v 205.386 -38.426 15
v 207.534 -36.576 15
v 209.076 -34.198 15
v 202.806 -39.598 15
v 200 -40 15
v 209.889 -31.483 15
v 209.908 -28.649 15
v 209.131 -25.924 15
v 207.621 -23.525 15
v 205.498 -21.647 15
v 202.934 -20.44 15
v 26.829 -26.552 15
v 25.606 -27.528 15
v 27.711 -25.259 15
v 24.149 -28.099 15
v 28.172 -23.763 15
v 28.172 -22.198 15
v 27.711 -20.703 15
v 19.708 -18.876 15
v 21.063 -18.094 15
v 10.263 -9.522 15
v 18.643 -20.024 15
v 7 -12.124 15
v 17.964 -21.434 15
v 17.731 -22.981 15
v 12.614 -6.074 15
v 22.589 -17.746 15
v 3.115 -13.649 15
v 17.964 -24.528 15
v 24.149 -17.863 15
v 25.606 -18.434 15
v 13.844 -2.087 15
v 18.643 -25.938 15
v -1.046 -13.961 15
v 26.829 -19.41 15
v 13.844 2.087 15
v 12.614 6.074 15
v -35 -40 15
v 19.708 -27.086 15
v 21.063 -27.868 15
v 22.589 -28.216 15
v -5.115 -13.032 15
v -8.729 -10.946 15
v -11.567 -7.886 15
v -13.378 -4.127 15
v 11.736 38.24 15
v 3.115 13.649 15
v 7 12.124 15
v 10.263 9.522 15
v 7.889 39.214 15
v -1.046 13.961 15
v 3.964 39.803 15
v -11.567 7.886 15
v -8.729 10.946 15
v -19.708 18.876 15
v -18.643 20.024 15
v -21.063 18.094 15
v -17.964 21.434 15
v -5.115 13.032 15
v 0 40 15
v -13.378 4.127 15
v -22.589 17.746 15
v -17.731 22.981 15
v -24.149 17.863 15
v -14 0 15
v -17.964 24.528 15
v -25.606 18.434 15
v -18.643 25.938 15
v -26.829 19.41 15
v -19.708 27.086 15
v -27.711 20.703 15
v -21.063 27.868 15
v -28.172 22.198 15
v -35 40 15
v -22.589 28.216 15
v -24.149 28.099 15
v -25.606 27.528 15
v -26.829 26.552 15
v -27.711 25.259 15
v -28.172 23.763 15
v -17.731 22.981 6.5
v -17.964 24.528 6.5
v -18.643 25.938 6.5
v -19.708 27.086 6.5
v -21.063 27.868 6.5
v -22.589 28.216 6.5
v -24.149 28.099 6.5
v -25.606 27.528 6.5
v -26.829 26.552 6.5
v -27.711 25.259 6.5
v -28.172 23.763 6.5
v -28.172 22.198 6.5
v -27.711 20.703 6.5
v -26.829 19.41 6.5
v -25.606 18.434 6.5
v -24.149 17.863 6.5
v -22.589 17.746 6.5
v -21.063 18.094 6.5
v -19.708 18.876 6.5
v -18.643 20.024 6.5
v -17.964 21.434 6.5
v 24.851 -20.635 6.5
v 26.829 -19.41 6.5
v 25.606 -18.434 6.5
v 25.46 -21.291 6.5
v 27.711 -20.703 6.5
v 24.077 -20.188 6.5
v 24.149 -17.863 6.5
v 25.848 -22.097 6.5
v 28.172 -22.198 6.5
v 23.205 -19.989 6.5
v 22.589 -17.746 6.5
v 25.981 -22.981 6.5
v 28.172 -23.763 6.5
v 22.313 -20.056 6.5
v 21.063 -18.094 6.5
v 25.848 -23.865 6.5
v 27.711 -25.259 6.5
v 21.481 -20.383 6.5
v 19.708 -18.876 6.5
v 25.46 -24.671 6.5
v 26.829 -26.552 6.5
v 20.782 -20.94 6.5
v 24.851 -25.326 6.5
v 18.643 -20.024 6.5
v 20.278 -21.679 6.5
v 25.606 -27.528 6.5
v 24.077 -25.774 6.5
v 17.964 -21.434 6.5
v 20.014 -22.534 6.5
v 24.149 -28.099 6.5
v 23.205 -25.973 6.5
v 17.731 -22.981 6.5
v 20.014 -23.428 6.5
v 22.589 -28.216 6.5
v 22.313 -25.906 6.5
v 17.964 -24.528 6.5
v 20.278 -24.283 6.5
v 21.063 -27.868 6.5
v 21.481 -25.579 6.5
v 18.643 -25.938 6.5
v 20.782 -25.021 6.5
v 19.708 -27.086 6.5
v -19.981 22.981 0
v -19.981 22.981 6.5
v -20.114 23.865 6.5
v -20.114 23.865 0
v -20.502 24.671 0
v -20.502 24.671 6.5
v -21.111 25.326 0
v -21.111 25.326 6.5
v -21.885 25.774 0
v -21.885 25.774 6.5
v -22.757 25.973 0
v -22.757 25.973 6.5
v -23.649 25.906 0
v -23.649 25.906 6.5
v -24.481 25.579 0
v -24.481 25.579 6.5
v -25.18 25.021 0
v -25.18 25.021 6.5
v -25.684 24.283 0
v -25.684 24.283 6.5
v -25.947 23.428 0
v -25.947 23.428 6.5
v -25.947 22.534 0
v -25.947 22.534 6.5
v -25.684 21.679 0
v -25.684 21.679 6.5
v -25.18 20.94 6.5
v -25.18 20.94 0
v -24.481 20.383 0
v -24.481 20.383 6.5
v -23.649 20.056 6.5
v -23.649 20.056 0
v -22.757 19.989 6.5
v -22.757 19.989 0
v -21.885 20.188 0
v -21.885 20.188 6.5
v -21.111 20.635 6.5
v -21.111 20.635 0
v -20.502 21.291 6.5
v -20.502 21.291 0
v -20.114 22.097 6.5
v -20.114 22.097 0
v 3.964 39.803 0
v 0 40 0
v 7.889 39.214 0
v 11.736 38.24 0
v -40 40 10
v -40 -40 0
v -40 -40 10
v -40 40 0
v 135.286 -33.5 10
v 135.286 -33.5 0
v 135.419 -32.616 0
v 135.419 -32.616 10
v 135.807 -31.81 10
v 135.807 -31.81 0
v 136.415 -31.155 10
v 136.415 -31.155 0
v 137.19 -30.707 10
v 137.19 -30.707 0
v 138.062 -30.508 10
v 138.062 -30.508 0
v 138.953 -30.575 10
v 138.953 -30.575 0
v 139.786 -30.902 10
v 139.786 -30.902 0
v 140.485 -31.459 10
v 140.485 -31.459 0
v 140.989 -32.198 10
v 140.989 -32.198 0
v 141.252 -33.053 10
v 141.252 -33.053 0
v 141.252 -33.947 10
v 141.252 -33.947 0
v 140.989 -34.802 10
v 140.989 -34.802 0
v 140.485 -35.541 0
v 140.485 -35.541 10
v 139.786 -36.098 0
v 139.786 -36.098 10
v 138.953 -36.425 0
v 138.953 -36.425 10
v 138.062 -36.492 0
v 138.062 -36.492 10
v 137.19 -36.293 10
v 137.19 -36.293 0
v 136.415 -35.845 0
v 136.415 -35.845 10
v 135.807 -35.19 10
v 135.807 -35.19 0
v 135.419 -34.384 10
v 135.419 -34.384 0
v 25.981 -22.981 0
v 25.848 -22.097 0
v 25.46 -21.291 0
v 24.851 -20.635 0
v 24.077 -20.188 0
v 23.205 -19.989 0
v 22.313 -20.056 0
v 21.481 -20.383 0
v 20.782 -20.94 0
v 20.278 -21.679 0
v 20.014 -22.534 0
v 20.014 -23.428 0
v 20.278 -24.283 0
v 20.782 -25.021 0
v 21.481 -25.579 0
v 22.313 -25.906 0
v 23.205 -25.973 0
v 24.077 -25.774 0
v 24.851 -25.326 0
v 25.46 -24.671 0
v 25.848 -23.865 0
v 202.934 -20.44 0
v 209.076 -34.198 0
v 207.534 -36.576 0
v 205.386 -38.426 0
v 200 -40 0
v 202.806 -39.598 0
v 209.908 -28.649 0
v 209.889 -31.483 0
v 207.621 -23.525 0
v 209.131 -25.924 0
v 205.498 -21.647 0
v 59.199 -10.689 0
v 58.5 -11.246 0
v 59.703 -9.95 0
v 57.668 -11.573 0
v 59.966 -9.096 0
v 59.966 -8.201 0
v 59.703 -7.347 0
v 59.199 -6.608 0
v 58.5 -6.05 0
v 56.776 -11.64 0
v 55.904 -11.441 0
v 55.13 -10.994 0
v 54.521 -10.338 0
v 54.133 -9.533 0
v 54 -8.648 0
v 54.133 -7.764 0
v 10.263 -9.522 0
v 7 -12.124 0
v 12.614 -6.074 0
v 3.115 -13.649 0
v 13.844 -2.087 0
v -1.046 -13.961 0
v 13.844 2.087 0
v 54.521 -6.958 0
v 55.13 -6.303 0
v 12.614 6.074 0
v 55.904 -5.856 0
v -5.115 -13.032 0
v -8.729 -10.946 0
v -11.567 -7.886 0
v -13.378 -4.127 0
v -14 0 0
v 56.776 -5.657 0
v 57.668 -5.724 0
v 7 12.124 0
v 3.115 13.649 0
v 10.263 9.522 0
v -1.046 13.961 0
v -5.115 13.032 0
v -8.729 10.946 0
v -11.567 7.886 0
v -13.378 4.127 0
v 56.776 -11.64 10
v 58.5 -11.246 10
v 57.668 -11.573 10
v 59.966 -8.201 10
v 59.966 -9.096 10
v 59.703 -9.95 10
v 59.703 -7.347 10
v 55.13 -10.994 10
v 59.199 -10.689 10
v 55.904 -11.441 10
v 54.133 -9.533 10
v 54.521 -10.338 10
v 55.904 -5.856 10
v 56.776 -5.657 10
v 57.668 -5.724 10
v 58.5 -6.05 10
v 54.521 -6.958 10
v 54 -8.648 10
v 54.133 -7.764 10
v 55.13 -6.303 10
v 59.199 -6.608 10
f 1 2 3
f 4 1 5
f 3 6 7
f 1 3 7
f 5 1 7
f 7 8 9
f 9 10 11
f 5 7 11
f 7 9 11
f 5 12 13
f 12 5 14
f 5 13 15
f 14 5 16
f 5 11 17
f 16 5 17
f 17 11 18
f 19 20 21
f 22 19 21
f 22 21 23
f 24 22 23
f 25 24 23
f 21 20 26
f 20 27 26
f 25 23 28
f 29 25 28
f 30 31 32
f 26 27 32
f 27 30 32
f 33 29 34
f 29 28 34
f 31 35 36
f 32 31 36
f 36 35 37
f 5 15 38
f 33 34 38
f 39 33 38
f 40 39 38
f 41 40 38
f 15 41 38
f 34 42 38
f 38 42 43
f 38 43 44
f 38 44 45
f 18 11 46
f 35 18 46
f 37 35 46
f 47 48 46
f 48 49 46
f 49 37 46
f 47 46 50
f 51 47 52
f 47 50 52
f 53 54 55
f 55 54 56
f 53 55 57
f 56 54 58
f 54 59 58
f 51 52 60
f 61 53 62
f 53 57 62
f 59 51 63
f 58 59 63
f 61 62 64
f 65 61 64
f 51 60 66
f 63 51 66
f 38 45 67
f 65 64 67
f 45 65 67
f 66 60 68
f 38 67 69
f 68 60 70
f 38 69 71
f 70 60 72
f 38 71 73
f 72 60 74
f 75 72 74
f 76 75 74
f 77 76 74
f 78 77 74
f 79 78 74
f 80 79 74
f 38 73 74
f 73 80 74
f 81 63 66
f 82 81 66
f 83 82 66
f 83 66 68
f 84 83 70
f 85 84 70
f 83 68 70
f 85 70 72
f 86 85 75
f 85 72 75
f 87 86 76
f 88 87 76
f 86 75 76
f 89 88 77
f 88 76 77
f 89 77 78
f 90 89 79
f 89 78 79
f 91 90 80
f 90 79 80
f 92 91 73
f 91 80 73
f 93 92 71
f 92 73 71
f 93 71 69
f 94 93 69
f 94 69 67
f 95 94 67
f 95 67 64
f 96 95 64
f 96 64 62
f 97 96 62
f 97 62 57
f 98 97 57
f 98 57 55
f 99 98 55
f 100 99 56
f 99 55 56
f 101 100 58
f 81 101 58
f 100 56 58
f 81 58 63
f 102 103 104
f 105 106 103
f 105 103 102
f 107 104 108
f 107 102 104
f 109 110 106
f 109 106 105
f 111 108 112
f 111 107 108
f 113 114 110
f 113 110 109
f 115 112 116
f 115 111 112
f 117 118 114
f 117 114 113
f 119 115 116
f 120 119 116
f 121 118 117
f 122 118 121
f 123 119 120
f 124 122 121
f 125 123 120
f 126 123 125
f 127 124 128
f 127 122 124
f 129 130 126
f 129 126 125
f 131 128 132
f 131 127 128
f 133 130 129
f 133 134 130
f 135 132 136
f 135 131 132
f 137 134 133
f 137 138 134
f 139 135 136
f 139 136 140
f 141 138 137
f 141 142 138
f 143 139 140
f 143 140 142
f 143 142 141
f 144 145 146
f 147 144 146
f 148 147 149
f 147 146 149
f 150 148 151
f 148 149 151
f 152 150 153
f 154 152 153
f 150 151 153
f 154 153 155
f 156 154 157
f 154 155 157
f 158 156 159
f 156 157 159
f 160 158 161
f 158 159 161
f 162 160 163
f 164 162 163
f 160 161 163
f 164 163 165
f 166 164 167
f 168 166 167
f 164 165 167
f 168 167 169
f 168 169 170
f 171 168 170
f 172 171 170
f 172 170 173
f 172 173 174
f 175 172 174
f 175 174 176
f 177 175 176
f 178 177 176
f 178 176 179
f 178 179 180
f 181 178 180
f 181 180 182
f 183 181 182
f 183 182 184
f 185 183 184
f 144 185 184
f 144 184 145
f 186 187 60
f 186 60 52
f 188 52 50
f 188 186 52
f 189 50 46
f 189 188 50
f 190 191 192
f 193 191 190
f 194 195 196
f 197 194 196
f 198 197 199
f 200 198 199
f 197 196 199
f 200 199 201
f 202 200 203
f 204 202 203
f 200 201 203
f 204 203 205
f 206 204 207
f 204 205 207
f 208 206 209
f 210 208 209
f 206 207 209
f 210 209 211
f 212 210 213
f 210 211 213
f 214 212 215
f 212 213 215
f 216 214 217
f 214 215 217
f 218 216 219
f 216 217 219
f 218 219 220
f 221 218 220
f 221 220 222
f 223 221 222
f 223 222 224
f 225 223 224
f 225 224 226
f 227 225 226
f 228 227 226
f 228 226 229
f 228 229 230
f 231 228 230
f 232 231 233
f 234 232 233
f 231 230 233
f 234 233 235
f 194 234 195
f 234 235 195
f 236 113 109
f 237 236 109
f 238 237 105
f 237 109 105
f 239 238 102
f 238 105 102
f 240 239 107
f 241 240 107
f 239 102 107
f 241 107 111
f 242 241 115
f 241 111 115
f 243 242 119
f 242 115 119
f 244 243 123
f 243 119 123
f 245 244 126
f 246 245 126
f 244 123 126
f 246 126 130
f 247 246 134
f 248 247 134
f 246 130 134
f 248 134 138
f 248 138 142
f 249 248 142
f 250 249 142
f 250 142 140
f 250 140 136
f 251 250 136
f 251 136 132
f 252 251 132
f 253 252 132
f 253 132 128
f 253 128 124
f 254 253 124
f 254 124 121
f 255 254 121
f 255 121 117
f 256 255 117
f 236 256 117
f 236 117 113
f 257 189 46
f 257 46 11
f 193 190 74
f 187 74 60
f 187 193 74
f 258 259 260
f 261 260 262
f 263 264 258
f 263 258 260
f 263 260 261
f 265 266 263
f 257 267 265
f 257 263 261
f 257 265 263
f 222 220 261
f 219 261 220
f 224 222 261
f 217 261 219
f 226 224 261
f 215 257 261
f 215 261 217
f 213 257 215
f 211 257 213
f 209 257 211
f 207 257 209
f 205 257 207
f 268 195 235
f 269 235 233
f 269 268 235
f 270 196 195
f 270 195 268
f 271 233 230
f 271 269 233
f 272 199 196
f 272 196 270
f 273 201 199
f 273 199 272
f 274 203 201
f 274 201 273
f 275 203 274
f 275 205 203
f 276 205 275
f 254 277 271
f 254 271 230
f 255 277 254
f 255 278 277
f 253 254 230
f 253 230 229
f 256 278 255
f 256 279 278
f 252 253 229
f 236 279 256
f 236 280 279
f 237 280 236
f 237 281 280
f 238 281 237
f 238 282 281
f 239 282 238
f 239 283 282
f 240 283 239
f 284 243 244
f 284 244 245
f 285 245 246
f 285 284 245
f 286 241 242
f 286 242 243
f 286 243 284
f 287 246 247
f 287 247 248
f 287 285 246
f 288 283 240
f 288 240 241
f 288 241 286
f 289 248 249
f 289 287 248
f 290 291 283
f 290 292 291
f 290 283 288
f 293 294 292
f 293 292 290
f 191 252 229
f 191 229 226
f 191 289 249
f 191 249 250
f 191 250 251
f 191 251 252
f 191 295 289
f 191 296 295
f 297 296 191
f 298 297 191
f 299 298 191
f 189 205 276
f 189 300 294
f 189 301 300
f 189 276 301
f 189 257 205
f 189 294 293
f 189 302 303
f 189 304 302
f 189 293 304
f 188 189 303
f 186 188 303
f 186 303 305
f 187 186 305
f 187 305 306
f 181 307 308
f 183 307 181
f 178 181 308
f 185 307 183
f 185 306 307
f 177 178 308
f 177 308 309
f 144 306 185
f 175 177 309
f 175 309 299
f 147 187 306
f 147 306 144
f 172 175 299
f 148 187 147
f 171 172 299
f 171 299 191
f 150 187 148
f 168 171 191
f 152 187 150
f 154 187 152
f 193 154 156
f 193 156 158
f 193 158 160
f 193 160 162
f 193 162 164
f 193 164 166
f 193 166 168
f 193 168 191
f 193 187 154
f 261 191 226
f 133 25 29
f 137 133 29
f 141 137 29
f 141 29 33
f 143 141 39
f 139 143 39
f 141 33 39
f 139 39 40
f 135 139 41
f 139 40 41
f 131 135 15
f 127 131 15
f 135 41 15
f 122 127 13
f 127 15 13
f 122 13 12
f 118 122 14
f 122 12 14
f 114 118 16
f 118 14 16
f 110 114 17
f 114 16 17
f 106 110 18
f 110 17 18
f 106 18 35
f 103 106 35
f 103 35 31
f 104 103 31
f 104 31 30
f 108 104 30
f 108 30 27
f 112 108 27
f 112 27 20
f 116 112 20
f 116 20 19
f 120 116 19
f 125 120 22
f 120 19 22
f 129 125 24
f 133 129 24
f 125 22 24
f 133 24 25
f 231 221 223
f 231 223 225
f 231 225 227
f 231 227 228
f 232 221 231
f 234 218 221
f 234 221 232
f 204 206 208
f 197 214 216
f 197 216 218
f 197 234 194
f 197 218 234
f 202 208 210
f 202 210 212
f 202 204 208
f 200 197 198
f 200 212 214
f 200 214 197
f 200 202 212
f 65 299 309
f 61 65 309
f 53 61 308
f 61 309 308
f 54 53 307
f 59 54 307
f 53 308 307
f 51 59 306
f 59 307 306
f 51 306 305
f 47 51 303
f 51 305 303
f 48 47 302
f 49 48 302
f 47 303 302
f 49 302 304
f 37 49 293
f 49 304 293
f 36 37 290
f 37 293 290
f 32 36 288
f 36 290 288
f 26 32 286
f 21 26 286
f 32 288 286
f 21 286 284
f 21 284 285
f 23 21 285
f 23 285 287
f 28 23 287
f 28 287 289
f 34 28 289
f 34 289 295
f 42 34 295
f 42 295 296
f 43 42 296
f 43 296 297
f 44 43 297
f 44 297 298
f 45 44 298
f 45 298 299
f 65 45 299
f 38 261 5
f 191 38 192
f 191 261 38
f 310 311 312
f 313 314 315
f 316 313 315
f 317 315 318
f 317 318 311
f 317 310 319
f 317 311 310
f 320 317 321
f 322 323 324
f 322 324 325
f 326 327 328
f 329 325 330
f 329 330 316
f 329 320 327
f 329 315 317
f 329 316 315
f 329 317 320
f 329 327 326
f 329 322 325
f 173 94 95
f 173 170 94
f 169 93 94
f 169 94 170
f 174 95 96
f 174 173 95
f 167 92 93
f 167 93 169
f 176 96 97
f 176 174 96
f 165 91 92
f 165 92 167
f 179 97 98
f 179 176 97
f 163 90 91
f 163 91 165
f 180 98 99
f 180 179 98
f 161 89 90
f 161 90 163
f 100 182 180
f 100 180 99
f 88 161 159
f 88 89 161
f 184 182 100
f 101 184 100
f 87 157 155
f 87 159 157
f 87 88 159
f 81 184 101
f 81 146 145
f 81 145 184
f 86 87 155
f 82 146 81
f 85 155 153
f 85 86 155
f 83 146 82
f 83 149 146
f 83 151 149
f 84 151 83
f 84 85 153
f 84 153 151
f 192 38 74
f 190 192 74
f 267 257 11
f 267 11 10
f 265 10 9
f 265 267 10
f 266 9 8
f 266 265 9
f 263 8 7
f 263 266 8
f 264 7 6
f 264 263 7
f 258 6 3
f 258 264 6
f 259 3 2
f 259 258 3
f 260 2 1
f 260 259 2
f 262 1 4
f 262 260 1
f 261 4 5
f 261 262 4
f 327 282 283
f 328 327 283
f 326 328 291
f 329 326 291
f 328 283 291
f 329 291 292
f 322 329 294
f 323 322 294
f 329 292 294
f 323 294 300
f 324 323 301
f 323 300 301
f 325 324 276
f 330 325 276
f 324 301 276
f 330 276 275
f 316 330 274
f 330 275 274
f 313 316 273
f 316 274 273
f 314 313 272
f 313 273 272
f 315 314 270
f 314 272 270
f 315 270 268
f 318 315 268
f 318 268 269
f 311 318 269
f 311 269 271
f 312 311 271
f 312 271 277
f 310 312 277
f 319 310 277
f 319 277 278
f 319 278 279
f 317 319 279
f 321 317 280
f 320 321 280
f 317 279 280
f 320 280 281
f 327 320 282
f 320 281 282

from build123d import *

# Parameters (mm, degrees)
ESTRUSIONE1_DEPTH        = 15
SMUSSO1_SIZE             = 5
SCHIZZO2_R               = 14
TAGLIO_ESTRUSIONE1_DEPTH = 59.523499554
SCHIZZO4_R               = 3
TAGLIO_ESTRUSIONE3_DEPTH = 20
SCHIZZO5_R               = 5.25
TAGLIO_ESTRUSIONE4_DEPTH = 8.5
ESTRUSIONE2_START        = -15
ESTRUSIONE2_DEPTH        = 15
SCHIZZO9_R               = 3
TAGLIO_ESTRUSIONE7_DEPTH = 10


with BuildPart() as part:
    # Schizzo1 → Estrusione1 (new body)
    with BuildSketch(Plane.XY):
        with BuildLine():
            Line((-40, 40), (0, 40))
            ThreePointArc((0, 40), (40, 0), (0, -40))
            Line((0, -40), (-40, -40))
            Line((-40, -40), (-40, 40))
        make_face()
    extrude(amount=ESTRUSIONE1_DEPTH)

    # Smusso1
    smusso1_edges = [part.edges().sort_by_distance(p)[0] for p in [
        (-40, 0, 15),
    ]]
    chamfer(smusso1_edges, length=SMUSSO1_SIZE)

    # Schizzo2 → Taglio-Estrusione1 (cut, through all)
    with BuildSketch(Plane(origin=(0, 0, 0), x_dir=(-1, 0, 0), z_dir=(0, 0, -1))):
        Circle(SCHIZZO2_R)
    extrude(amount=-TAGLIO_ESTRUSIONE1_DEPTH, mode=Mode.SUBTRACT)

    # Schizzo4 → Taglio-Estrusione3 (cut)
    with BuildSketch(Plane.XY.offset(15)):
        with Locations((-22.980970389, 22.980970389)):
            Circle(SCHIZZO4_R)
        with Locations((22.980970389, -22.980970389)):
            Circle(SCHIZZO4_R)
    extrude(amount=-TAGLIO_ESTRUSIONE3_DEPTH, mode=Mode.SUBTRACT)

    # Schizzo5 → Taglio-Estrusione4 (cut)
    with BuildSketch(Plane.XY.offset(15)):
        with Locations((-22.980970389, 22.980970389)):
            Circle(SCHIZZO5_R)
        with Locations(Location((22.980970389, -22.980970389, 0), (0, 0, 180))):
            Circle(SCHIZZO5_R)
    extrude(amount=-TAGLIO_ESTRUSIONE4_DEPTH, mode=Mode.SUBTRACT)

    # Schizzo6 → Estrusione2 (add)
    with BuildSketch(Plane.XY.offset(15).offset(ESTRUSIONE2_START)):
        with BuildLine():
            Line((11.73594132, 38.239608802), (202.93398533, -20.4400978))
            ThreePointArc((202.93398533, -20.4400978), (209.889363529, -31.483404529), (200, -40))
            Line((200, -40), (0, -40))
            ThreePointArc((0, -40), (39.557454115, -5.933618117), (11.73594132, 38.239608802))
        make_face()
    extrude(amount=ESTRUSIONE2_DEPTH)

    # Schizzo9 → Taglio-Estrusione7 (cut)
    with BuildSketch(Plane(origin=(0, 0, 0), x_dir=(-1, 0, 0), z_dir=(0, 0, -1))):
        with Locations((-57, -8.648405099)):
            Circle(SCHIZZO9_R)
        with Locations((-138.285904257, -33.5)):
            Circle(SCHIZZO9_R)
    extrude(amount=-TAGLIO_ESTRUSIONE7_DEPTH, mode=Mode.SUBTRACT)


solid = part.part
